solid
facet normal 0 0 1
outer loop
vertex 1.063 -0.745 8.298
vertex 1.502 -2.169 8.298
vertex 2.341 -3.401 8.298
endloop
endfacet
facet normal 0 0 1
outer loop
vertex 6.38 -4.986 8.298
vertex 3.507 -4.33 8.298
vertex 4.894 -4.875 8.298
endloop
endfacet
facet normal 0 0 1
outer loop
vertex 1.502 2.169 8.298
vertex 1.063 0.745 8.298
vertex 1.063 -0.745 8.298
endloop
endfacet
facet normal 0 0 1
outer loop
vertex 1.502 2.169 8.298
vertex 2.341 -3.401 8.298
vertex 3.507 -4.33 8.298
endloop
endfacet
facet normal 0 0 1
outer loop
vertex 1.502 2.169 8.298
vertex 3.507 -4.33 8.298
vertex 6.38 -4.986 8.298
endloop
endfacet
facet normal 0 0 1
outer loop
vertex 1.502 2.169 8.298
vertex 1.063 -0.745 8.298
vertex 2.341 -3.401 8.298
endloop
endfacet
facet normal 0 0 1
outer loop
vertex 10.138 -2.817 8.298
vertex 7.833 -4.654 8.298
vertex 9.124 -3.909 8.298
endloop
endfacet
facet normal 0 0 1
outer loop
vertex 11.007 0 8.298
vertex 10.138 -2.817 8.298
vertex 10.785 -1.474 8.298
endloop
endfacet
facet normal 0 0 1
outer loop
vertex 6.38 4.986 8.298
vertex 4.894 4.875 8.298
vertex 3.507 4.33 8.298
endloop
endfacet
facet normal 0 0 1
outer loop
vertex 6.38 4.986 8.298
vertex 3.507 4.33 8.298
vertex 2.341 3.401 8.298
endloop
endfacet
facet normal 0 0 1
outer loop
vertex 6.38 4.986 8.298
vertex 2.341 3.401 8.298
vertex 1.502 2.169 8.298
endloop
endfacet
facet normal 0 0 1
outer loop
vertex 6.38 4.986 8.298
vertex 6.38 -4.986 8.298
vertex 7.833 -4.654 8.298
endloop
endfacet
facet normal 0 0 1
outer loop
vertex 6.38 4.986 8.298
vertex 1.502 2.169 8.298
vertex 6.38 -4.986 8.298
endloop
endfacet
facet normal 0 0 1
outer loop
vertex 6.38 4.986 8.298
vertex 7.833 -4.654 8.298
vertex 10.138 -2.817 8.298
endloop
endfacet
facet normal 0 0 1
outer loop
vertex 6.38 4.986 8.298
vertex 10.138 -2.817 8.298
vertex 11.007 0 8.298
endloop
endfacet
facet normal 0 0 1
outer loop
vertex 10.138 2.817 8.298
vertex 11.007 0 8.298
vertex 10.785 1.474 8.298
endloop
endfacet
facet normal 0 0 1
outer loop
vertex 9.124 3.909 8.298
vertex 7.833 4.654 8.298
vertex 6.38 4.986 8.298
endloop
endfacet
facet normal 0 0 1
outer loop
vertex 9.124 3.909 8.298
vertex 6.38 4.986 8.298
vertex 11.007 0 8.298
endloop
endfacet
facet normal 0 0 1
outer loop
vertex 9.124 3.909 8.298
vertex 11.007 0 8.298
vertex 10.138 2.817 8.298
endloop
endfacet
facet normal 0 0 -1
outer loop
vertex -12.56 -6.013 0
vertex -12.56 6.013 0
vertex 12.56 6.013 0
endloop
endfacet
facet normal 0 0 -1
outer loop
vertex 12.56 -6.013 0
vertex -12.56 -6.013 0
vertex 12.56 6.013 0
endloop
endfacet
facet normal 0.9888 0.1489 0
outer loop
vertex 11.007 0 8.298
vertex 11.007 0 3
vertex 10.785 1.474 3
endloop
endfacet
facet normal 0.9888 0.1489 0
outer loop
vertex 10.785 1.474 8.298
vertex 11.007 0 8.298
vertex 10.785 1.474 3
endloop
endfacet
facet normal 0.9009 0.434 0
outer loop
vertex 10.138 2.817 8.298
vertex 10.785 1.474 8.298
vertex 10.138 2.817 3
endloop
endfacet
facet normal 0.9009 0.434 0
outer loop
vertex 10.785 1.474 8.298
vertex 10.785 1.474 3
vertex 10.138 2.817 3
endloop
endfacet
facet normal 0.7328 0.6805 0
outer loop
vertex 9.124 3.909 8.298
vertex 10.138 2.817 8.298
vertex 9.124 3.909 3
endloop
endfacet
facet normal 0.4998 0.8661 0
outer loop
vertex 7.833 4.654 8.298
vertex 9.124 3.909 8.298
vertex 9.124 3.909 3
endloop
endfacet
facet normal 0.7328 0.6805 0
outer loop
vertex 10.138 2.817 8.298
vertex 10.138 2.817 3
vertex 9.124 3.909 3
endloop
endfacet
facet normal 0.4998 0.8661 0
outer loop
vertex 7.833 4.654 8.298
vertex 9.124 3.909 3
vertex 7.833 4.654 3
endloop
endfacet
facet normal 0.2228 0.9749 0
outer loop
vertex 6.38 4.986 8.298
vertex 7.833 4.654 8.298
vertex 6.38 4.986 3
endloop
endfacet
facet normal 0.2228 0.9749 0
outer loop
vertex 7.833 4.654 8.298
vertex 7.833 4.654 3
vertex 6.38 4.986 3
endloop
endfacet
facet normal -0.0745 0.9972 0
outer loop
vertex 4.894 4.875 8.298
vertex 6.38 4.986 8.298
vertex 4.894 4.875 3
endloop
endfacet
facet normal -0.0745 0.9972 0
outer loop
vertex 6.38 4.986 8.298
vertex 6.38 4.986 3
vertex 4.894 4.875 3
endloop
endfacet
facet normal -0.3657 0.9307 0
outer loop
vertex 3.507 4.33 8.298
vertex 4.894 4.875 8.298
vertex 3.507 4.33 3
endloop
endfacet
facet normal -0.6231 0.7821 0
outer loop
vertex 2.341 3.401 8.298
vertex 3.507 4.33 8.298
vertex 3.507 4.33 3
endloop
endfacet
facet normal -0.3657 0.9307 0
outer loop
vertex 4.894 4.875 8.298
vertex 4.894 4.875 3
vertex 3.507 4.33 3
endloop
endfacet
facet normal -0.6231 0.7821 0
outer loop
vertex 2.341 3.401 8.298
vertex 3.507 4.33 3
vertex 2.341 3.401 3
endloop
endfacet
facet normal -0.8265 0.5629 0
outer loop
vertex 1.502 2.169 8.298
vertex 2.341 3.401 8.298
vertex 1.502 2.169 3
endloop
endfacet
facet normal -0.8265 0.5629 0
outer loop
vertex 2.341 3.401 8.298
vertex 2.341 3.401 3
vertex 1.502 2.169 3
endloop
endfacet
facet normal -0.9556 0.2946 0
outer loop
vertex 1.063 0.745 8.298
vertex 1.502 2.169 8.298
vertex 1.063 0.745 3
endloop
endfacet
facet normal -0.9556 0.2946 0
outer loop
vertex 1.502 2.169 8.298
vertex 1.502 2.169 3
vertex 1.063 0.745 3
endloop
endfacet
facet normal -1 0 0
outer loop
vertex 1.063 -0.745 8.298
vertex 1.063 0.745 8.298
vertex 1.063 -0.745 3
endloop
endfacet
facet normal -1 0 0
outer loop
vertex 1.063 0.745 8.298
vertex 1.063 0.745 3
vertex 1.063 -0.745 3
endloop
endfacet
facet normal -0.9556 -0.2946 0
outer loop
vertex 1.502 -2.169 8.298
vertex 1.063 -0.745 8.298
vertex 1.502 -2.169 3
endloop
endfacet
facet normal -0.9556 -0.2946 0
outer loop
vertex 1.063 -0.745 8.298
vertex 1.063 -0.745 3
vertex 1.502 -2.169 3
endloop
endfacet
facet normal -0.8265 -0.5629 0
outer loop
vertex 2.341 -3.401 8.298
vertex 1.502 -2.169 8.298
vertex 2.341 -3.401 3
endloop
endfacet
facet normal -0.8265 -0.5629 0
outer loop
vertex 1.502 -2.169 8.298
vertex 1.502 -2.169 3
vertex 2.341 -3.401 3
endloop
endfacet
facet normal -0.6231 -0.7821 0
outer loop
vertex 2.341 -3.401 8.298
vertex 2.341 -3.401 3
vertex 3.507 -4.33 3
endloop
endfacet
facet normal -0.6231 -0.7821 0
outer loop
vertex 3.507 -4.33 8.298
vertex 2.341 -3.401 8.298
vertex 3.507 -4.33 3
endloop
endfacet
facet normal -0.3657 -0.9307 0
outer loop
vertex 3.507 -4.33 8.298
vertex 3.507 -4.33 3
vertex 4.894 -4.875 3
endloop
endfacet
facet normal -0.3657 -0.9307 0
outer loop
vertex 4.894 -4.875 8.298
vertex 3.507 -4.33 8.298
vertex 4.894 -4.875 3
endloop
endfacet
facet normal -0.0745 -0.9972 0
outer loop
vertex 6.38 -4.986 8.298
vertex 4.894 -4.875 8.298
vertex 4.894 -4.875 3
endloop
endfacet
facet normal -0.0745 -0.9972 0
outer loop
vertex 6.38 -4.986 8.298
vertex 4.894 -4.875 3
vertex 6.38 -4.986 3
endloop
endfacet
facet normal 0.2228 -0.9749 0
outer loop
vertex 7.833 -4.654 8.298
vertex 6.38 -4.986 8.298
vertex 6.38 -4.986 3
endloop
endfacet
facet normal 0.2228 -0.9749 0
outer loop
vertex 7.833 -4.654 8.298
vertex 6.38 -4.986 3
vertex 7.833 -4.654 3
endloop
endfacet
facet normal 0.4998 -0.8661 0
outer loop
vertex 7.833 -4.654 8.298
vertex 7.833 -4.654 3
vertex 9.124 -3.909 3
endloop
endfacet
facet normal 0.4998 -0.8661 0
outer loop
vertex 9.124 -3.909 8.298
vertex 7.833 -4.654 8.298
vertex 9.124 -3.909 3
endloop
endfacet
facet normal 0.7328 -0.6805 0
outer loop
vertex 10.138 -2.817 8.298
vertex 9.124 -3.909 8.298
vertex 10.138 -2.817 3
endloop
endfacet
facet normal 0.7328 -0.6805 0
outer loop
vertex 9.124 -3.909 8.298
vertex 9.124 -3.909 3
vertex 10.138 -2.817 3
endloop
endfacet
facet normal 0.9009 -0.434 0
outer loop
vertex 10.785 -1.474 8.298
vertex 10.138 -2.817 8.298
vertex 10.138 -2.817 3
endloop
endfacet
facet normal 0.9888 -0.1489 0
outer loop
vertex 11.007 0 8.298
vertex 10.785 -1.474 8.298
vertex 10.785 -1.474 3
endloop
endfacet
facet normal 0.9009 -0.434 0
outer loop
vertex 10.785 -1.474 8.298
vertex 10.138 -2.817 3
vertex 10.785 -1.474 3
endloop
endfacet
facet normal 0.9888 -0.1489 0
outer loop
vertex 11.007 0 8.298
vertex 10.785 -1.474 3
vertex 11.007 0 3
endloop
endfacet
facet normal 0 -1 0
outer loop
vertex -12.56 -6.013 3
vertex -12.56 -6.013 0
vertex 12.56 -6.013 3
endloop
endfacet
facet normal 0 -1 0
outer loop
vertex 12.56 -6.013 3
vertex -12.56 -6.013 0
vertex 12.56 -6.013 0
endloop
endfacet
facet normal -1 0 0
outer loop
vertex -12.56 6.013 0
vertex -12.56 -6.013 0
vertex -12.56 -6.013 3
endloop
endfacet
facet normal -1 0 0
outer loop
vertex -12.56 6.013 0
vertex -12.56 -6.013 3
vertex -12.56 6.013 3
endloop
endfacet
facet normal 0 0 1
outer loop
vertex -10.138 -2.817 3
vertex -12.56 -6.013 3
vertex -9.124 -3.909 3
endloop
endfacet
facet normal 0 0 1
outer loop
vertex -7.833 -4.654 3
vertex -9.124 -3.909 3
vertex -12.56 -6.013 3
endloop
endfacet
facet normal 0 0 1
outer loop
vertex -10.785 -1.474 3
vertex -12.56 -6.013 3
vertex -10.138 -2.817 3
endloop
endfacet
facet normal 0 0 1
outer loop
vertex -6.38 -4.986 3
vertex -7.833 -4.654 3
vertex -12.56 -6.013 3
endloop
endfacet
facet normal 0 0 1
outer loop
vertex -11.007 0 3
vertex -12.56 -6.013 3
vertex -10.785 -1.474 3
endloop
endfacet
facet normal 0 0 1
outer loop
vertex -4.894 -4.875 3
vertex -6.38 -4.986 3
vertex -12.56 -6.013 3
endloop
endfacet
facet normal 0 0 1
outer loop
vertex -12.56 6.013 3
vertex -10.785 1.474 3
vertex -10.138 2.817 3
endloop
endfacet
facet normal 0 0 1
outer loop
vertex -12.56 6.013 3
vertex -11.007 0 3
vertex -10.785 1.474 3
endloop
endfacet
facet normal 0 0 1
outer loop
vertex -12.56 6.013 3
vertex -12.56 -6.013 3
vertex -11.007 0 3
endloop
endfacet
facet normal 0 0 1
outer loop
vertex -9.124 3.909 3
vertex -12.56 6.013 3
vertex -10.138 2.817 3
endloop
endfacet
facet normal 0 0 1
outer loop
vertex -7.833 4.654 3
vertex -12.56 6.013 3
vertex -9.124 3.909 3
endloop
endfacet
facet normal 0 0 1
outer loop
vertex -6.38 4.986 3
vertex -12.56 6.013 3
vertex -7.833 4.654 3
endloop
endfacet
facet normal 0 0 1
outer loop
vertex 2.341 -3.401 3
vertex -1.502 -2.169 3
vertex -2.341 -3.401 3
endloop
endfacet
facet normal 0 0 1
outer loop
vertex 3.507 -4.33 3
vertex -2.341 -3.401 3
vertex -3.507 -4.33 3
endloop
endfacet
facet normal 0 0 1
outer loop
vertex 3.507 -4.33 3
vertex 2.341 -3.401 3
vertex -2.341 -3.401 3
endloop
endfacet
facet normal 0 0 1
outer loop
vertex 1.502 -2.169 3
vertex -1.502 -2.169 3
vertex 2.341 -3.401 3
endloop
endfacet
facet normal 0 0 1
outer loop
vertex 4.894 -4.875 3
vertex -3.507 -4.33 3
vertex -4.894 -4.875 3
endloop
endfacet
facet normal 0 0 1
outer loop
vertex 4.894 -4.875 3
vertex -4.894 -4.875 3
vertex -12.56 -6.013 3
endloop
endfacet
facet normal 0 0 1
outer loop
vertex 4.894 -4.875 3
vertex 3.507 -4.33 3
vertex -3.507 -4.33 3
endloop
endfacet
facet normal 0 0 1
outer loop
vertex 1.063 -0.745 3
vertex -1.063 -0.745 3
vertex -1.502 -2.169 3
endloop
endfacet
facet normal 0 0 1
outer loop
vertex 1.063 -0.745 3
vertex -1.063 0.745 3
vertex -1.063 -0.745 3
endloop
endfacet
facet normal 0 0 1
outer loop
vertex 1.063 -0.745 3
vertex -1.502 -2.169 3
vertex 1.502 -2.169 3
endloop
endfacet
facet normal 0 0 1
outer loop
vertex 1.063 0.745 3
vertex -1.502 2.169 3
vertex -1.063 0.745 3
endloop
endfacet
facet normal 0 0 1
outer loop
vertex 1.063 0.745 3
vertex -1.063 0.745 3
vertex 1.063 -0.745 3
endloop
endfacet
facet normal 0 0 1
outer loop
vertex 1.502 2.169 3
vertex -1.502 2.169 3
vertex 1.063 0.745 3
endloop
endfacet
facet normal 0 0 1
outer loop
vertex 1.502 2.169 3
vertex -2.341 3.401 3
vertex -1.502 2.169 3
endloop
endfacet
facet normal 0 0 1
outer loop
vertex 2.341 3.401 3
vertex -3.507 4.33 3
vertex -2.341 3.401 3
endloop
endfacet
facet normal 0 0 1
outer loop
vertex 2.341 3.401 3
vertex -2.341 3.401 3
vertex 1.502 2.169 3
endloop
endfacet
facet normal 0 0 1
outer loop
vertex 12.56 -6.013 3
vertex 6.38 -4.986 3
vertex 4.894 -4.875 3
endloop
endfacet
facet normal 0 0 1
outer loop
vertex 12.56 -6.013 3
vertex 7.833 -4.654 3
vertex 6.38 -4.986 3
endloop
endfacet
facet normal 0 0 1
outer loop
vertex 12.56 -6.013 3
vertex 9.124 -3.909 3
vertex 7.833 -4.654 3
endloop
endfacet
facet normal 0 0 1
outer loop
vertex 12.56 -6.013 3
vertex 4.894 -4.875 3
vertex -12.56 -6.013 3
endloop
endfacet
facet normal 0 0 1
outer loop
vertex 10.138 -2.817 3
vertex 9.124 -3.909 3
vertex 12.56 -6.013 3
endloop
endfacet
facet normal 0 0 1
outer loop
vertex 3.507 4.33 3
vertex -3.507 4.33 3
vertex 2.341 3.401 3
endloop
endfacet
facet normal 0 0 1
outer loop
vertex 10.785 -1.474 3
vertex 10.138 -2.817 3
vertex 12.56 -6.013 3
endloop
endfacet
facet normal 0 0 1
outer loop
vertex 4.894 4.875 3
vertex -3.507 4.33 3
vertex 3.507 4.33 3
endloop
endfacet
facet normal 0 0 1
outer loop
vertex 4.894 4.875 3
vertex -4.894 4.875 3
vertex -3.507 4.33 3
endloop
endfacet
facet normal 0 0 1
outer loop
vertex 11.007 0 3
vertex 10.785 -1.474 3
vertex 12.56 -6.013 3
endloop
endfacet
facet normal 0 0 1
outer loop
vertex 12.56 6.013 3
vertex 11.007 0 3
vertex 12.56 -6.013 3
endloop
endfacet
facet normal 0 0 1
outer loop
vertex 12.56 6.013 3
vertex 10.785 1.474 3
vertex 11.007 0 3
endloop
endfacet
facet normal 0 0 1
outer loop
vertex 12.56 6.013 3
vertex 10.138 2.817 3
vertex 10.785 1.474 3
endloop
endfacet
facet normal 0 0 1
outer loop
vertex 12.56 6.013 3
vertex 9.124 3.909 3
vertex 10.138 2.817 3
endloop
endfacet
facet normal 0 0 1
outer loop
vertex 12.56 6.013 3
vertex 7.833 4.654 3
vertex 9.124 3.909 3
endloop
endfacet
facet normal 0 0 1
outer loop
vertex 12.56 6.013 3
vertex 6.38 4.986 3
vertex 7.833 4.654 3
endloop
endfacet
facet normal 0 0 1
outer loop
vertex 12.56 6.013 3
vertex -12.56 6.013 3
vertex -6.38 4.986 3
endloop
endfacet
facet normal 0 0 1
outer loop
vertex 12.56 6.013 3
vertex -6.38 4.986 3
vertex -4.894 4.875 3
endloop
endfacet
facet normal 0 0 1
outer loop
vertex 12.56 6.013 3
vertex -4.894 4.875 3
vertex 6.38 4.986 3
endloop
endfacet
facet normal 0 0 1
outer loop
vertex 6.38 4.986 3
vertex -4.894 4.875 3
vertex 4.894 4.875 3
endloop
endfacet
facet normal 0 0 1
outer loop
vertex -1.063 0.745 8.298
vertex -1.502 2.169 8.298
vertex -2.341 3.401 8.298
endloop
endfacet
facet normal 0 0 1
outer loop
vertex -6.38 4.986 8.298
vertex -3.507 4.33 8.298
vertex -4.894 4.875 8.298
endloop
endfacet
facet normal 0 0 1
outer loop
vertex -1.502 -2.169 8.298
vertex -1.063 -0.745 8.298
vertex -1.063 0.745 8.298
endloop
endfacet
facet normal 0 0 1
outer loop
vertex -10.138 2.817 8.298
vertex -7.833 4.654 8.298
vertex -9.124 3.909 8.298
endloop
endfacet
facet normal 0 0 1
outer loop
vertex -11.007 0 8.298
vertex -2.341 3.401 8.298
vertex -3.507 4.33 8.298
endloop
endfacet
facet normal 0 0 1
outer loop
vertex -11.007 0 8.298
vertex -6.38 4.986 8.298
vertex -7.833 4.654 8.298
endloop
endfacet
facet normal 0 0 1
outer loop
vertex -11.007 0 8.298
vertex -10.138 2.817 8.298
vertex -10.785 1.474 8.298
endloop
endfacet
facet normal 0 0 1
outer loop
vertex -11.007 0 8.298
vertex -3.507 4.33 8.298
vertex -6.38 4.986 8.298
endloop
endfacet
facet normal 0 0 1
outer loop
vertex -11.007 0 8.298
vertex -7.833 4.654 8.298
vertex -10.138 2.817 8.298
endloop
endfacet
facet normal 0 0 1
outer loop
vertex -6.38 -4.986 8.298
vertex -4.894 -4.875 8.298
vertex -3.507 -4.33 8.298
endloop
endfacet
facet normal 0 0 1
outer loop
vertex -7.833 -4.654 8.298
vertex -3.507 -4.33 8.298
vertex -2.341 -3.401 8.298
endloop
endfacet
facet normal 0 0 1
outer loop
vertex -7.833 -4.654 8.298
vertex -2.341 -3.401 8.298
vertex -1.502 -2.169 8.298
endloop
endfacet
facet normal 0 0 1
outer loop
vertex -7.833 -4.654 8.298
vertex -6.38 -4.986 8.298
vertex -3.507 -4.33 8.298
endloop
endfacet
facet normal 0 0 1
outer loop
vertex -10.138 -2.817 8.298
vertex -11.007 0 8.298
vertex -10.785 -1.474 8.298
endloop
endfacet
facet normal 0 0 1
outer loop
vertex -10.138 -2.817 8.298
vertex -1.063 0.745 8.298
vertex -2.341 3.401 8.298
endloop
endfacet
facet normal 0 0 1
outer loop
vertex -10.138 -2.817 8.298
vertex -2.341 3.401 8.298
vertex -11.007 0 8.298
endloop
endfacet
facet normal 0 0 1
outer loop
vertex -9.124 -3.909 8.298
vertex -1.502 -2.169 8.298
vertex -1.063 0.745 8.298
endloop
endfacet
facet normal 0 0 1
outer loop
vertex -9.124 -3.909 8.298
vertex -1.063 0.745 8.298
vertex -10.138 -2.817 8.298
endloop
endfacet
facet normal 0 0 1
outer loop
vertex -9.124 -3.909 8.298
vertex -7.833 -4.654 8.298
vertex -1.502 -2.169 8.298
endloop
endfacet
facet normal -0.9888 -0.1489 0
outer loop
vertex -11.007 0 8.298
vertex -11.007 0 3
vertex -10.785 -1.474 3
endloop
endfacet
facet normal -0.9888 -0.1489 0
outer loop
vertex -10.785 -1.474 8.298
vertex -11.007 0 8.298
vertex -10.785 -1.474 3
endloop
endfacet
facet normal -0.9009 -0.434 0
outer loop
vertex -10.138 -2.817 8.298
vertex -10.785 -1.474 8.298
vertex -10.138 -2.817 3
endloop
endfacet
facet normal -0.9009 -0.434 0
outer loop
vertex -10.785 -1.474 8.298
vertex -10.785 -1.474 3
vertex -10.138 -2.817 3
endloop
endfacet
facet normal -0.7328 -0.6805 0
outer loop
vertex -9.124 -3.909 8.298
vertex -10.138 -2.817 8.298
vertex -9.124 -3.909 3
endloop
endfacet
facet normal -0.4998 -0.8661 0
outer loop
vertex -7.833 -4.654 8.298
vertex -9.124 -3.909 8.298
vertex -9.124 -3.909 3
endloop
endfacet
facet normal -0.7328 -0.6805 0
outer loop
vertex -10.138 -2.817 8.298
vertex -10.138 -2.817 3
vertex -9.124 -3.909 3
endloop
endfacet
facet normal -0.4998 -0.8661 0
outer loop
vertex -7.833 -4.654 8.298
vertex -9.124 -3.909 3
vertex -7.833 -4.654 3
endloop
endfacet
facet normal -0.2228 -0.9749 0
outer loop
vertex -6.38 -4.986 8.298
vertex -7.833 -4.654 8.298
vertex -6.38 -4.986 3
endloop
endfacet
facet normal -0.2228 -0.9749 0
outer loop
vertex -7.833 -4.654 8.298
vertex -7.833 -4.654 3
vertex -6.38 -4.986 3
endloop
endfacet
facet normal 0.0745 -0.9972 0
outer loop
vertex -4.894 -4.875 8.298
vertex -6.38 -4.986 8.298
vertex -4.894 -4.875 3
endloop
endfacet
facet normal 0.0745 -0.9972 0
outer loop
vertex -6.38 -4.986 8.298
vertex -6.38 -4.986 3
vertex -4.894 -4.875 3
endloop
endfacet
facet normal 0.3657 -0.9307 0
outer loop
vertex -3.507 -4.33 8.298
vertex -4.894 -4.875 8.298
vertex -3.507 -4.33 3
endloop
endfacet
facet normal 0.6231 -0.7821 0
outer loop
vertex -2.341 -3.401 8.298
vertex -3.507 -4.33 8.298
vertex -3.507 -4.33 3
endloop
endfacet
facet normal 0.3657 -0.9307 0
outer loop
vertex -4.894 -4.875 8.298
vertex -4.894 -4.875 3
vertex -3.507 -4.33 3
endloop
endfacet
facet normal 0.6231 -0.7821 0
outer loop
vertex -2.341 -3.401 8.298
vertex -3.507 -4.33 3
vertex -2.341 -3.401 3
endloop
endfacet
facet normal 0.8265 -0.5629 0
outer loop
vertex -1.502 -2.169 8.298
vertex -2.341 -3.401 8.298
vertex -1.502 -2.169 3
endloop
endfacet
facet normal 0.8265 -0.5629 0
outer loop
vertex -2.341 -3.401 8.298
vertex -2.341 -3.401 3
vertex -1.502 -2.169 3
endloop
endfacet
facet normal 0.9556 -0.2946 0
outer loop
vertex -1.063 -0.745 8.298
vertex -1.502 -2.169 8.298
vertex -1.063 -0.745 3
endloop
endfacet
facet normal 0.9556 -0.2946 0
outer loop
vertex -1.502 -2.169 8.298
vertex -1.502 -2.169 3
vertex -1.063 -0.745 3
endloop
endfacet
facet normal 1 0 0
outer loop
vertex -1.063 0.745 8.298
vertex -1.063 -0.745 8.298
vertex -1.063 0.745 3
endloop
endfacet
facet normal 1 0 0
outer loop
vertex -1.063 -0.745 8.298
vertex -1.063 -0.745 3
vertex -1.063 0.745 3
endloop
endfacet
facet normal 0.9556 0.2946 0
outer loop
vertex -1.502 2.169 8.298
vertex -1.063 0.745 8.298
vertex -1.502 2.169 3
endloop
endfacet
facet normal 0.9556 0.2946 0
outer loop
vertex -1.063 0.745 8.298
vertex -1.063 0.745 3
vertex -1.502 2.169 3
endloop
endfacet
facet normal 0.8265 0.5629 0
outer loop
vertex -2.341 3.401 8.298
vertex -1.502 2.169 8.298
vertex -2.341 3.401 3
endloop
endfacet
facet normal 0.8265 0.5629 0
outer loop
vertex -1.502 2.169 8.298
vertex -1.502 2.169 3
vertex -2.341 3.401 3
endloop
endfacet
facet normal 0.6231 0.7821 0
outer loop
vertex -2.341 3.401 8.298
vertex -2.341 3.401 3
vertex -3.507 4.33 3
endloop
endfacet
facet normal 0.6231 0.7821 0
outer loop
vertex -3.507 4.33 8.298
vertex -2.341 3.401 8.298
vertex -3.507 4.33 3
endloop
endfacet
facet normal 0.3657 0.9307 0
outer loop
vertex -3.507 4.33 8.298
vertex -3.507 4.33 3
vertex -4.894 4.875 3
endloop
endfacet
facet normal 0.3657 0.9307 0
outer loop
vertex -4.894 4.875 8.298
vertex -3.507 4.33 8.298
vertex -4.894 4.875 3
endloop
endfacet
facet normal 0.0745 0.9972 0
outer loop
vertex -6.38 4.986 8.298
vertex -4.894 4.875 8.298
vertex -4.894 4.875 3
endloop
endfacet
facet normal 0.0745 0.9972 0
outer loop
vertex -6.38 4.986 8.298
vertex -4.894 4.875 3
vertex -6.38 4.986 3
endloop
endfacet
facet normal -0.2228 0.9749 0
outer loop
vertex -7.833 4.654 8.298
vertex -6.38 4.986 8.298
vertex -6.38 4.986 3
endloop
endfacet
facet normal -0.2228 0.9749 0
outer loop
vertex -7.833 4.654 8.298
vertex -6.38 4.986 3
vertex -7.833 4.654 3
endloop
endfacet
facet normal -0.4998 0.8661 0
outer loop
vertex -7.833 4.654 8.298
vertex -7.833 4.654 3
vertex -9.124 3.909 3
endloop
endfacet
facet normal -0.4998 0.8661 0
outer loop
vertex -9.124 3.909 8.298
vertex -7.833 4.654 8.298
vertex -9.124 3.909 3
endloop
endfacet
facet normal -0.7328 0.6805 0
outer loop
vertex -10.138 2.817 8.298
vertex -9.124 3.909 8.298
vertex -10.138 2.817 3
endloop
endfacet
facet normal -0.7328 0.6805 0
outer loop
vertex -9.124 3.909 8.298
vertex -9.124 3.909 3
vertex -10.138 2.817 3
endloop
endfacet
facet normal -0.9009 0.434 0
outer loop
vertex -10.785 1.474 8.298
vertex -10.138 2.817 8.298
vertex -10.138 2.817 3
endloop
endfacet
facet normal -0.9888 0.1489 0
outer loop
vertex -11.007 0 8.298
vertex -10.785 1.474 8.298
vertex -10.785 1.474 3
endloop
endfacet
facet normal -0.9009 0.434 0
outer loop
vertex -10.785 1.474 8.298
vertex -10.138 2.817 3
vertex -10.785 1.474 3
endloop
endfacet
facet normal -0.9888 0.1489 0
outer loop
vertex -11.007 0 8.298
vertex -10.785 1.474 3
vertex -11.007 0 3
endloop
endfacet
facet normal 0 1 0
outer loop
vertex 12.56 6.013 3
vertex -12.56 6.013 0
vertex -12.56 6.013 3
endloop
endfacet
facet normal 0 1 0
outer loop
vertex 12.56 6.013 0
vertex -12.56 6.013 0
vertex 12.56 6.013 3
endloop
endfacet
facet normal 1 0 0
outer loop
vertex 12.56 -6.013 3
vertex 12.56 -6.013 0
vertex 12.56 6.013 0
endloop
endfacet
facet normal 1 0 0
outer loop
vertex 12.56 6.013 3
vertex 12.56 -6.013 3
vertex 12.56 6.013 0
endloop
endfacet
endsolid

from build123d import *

# Parameters (mm, degrees)
SKETCH_3_W      = 25.120236726
SKETCH_3_H      = 12.02564524
EXTRUDE_1_DEPTH = 3
SKETCH_4_R      = 5
EXTRUDE_2_DEPTH = 5.297900912


with BuildPart() as part:
    # 草图3 → 凸台-拉伸1 (new body)
    with BuildSketch(Plane.XY):
        Rectangle(SKETCH_3_W, SKETCH_3_H)
    extrude(amount=EXTRUDE_1_DEPTH)

    # 草图4 → 凸台-拉伸2 (add)
    with BuildSketch(Plane.XY.offset(3)):
        with Locations((6.006662197, 0)):
            Circle(SKETCH_4_R)
        with Locations(Location((-6.006662197, 0, 0), (0, 0, 180))):
            Circle(SKETCH_4_R)
    extrude(amount=EXTRUDE_2_DEPTH)


solid = part.part
